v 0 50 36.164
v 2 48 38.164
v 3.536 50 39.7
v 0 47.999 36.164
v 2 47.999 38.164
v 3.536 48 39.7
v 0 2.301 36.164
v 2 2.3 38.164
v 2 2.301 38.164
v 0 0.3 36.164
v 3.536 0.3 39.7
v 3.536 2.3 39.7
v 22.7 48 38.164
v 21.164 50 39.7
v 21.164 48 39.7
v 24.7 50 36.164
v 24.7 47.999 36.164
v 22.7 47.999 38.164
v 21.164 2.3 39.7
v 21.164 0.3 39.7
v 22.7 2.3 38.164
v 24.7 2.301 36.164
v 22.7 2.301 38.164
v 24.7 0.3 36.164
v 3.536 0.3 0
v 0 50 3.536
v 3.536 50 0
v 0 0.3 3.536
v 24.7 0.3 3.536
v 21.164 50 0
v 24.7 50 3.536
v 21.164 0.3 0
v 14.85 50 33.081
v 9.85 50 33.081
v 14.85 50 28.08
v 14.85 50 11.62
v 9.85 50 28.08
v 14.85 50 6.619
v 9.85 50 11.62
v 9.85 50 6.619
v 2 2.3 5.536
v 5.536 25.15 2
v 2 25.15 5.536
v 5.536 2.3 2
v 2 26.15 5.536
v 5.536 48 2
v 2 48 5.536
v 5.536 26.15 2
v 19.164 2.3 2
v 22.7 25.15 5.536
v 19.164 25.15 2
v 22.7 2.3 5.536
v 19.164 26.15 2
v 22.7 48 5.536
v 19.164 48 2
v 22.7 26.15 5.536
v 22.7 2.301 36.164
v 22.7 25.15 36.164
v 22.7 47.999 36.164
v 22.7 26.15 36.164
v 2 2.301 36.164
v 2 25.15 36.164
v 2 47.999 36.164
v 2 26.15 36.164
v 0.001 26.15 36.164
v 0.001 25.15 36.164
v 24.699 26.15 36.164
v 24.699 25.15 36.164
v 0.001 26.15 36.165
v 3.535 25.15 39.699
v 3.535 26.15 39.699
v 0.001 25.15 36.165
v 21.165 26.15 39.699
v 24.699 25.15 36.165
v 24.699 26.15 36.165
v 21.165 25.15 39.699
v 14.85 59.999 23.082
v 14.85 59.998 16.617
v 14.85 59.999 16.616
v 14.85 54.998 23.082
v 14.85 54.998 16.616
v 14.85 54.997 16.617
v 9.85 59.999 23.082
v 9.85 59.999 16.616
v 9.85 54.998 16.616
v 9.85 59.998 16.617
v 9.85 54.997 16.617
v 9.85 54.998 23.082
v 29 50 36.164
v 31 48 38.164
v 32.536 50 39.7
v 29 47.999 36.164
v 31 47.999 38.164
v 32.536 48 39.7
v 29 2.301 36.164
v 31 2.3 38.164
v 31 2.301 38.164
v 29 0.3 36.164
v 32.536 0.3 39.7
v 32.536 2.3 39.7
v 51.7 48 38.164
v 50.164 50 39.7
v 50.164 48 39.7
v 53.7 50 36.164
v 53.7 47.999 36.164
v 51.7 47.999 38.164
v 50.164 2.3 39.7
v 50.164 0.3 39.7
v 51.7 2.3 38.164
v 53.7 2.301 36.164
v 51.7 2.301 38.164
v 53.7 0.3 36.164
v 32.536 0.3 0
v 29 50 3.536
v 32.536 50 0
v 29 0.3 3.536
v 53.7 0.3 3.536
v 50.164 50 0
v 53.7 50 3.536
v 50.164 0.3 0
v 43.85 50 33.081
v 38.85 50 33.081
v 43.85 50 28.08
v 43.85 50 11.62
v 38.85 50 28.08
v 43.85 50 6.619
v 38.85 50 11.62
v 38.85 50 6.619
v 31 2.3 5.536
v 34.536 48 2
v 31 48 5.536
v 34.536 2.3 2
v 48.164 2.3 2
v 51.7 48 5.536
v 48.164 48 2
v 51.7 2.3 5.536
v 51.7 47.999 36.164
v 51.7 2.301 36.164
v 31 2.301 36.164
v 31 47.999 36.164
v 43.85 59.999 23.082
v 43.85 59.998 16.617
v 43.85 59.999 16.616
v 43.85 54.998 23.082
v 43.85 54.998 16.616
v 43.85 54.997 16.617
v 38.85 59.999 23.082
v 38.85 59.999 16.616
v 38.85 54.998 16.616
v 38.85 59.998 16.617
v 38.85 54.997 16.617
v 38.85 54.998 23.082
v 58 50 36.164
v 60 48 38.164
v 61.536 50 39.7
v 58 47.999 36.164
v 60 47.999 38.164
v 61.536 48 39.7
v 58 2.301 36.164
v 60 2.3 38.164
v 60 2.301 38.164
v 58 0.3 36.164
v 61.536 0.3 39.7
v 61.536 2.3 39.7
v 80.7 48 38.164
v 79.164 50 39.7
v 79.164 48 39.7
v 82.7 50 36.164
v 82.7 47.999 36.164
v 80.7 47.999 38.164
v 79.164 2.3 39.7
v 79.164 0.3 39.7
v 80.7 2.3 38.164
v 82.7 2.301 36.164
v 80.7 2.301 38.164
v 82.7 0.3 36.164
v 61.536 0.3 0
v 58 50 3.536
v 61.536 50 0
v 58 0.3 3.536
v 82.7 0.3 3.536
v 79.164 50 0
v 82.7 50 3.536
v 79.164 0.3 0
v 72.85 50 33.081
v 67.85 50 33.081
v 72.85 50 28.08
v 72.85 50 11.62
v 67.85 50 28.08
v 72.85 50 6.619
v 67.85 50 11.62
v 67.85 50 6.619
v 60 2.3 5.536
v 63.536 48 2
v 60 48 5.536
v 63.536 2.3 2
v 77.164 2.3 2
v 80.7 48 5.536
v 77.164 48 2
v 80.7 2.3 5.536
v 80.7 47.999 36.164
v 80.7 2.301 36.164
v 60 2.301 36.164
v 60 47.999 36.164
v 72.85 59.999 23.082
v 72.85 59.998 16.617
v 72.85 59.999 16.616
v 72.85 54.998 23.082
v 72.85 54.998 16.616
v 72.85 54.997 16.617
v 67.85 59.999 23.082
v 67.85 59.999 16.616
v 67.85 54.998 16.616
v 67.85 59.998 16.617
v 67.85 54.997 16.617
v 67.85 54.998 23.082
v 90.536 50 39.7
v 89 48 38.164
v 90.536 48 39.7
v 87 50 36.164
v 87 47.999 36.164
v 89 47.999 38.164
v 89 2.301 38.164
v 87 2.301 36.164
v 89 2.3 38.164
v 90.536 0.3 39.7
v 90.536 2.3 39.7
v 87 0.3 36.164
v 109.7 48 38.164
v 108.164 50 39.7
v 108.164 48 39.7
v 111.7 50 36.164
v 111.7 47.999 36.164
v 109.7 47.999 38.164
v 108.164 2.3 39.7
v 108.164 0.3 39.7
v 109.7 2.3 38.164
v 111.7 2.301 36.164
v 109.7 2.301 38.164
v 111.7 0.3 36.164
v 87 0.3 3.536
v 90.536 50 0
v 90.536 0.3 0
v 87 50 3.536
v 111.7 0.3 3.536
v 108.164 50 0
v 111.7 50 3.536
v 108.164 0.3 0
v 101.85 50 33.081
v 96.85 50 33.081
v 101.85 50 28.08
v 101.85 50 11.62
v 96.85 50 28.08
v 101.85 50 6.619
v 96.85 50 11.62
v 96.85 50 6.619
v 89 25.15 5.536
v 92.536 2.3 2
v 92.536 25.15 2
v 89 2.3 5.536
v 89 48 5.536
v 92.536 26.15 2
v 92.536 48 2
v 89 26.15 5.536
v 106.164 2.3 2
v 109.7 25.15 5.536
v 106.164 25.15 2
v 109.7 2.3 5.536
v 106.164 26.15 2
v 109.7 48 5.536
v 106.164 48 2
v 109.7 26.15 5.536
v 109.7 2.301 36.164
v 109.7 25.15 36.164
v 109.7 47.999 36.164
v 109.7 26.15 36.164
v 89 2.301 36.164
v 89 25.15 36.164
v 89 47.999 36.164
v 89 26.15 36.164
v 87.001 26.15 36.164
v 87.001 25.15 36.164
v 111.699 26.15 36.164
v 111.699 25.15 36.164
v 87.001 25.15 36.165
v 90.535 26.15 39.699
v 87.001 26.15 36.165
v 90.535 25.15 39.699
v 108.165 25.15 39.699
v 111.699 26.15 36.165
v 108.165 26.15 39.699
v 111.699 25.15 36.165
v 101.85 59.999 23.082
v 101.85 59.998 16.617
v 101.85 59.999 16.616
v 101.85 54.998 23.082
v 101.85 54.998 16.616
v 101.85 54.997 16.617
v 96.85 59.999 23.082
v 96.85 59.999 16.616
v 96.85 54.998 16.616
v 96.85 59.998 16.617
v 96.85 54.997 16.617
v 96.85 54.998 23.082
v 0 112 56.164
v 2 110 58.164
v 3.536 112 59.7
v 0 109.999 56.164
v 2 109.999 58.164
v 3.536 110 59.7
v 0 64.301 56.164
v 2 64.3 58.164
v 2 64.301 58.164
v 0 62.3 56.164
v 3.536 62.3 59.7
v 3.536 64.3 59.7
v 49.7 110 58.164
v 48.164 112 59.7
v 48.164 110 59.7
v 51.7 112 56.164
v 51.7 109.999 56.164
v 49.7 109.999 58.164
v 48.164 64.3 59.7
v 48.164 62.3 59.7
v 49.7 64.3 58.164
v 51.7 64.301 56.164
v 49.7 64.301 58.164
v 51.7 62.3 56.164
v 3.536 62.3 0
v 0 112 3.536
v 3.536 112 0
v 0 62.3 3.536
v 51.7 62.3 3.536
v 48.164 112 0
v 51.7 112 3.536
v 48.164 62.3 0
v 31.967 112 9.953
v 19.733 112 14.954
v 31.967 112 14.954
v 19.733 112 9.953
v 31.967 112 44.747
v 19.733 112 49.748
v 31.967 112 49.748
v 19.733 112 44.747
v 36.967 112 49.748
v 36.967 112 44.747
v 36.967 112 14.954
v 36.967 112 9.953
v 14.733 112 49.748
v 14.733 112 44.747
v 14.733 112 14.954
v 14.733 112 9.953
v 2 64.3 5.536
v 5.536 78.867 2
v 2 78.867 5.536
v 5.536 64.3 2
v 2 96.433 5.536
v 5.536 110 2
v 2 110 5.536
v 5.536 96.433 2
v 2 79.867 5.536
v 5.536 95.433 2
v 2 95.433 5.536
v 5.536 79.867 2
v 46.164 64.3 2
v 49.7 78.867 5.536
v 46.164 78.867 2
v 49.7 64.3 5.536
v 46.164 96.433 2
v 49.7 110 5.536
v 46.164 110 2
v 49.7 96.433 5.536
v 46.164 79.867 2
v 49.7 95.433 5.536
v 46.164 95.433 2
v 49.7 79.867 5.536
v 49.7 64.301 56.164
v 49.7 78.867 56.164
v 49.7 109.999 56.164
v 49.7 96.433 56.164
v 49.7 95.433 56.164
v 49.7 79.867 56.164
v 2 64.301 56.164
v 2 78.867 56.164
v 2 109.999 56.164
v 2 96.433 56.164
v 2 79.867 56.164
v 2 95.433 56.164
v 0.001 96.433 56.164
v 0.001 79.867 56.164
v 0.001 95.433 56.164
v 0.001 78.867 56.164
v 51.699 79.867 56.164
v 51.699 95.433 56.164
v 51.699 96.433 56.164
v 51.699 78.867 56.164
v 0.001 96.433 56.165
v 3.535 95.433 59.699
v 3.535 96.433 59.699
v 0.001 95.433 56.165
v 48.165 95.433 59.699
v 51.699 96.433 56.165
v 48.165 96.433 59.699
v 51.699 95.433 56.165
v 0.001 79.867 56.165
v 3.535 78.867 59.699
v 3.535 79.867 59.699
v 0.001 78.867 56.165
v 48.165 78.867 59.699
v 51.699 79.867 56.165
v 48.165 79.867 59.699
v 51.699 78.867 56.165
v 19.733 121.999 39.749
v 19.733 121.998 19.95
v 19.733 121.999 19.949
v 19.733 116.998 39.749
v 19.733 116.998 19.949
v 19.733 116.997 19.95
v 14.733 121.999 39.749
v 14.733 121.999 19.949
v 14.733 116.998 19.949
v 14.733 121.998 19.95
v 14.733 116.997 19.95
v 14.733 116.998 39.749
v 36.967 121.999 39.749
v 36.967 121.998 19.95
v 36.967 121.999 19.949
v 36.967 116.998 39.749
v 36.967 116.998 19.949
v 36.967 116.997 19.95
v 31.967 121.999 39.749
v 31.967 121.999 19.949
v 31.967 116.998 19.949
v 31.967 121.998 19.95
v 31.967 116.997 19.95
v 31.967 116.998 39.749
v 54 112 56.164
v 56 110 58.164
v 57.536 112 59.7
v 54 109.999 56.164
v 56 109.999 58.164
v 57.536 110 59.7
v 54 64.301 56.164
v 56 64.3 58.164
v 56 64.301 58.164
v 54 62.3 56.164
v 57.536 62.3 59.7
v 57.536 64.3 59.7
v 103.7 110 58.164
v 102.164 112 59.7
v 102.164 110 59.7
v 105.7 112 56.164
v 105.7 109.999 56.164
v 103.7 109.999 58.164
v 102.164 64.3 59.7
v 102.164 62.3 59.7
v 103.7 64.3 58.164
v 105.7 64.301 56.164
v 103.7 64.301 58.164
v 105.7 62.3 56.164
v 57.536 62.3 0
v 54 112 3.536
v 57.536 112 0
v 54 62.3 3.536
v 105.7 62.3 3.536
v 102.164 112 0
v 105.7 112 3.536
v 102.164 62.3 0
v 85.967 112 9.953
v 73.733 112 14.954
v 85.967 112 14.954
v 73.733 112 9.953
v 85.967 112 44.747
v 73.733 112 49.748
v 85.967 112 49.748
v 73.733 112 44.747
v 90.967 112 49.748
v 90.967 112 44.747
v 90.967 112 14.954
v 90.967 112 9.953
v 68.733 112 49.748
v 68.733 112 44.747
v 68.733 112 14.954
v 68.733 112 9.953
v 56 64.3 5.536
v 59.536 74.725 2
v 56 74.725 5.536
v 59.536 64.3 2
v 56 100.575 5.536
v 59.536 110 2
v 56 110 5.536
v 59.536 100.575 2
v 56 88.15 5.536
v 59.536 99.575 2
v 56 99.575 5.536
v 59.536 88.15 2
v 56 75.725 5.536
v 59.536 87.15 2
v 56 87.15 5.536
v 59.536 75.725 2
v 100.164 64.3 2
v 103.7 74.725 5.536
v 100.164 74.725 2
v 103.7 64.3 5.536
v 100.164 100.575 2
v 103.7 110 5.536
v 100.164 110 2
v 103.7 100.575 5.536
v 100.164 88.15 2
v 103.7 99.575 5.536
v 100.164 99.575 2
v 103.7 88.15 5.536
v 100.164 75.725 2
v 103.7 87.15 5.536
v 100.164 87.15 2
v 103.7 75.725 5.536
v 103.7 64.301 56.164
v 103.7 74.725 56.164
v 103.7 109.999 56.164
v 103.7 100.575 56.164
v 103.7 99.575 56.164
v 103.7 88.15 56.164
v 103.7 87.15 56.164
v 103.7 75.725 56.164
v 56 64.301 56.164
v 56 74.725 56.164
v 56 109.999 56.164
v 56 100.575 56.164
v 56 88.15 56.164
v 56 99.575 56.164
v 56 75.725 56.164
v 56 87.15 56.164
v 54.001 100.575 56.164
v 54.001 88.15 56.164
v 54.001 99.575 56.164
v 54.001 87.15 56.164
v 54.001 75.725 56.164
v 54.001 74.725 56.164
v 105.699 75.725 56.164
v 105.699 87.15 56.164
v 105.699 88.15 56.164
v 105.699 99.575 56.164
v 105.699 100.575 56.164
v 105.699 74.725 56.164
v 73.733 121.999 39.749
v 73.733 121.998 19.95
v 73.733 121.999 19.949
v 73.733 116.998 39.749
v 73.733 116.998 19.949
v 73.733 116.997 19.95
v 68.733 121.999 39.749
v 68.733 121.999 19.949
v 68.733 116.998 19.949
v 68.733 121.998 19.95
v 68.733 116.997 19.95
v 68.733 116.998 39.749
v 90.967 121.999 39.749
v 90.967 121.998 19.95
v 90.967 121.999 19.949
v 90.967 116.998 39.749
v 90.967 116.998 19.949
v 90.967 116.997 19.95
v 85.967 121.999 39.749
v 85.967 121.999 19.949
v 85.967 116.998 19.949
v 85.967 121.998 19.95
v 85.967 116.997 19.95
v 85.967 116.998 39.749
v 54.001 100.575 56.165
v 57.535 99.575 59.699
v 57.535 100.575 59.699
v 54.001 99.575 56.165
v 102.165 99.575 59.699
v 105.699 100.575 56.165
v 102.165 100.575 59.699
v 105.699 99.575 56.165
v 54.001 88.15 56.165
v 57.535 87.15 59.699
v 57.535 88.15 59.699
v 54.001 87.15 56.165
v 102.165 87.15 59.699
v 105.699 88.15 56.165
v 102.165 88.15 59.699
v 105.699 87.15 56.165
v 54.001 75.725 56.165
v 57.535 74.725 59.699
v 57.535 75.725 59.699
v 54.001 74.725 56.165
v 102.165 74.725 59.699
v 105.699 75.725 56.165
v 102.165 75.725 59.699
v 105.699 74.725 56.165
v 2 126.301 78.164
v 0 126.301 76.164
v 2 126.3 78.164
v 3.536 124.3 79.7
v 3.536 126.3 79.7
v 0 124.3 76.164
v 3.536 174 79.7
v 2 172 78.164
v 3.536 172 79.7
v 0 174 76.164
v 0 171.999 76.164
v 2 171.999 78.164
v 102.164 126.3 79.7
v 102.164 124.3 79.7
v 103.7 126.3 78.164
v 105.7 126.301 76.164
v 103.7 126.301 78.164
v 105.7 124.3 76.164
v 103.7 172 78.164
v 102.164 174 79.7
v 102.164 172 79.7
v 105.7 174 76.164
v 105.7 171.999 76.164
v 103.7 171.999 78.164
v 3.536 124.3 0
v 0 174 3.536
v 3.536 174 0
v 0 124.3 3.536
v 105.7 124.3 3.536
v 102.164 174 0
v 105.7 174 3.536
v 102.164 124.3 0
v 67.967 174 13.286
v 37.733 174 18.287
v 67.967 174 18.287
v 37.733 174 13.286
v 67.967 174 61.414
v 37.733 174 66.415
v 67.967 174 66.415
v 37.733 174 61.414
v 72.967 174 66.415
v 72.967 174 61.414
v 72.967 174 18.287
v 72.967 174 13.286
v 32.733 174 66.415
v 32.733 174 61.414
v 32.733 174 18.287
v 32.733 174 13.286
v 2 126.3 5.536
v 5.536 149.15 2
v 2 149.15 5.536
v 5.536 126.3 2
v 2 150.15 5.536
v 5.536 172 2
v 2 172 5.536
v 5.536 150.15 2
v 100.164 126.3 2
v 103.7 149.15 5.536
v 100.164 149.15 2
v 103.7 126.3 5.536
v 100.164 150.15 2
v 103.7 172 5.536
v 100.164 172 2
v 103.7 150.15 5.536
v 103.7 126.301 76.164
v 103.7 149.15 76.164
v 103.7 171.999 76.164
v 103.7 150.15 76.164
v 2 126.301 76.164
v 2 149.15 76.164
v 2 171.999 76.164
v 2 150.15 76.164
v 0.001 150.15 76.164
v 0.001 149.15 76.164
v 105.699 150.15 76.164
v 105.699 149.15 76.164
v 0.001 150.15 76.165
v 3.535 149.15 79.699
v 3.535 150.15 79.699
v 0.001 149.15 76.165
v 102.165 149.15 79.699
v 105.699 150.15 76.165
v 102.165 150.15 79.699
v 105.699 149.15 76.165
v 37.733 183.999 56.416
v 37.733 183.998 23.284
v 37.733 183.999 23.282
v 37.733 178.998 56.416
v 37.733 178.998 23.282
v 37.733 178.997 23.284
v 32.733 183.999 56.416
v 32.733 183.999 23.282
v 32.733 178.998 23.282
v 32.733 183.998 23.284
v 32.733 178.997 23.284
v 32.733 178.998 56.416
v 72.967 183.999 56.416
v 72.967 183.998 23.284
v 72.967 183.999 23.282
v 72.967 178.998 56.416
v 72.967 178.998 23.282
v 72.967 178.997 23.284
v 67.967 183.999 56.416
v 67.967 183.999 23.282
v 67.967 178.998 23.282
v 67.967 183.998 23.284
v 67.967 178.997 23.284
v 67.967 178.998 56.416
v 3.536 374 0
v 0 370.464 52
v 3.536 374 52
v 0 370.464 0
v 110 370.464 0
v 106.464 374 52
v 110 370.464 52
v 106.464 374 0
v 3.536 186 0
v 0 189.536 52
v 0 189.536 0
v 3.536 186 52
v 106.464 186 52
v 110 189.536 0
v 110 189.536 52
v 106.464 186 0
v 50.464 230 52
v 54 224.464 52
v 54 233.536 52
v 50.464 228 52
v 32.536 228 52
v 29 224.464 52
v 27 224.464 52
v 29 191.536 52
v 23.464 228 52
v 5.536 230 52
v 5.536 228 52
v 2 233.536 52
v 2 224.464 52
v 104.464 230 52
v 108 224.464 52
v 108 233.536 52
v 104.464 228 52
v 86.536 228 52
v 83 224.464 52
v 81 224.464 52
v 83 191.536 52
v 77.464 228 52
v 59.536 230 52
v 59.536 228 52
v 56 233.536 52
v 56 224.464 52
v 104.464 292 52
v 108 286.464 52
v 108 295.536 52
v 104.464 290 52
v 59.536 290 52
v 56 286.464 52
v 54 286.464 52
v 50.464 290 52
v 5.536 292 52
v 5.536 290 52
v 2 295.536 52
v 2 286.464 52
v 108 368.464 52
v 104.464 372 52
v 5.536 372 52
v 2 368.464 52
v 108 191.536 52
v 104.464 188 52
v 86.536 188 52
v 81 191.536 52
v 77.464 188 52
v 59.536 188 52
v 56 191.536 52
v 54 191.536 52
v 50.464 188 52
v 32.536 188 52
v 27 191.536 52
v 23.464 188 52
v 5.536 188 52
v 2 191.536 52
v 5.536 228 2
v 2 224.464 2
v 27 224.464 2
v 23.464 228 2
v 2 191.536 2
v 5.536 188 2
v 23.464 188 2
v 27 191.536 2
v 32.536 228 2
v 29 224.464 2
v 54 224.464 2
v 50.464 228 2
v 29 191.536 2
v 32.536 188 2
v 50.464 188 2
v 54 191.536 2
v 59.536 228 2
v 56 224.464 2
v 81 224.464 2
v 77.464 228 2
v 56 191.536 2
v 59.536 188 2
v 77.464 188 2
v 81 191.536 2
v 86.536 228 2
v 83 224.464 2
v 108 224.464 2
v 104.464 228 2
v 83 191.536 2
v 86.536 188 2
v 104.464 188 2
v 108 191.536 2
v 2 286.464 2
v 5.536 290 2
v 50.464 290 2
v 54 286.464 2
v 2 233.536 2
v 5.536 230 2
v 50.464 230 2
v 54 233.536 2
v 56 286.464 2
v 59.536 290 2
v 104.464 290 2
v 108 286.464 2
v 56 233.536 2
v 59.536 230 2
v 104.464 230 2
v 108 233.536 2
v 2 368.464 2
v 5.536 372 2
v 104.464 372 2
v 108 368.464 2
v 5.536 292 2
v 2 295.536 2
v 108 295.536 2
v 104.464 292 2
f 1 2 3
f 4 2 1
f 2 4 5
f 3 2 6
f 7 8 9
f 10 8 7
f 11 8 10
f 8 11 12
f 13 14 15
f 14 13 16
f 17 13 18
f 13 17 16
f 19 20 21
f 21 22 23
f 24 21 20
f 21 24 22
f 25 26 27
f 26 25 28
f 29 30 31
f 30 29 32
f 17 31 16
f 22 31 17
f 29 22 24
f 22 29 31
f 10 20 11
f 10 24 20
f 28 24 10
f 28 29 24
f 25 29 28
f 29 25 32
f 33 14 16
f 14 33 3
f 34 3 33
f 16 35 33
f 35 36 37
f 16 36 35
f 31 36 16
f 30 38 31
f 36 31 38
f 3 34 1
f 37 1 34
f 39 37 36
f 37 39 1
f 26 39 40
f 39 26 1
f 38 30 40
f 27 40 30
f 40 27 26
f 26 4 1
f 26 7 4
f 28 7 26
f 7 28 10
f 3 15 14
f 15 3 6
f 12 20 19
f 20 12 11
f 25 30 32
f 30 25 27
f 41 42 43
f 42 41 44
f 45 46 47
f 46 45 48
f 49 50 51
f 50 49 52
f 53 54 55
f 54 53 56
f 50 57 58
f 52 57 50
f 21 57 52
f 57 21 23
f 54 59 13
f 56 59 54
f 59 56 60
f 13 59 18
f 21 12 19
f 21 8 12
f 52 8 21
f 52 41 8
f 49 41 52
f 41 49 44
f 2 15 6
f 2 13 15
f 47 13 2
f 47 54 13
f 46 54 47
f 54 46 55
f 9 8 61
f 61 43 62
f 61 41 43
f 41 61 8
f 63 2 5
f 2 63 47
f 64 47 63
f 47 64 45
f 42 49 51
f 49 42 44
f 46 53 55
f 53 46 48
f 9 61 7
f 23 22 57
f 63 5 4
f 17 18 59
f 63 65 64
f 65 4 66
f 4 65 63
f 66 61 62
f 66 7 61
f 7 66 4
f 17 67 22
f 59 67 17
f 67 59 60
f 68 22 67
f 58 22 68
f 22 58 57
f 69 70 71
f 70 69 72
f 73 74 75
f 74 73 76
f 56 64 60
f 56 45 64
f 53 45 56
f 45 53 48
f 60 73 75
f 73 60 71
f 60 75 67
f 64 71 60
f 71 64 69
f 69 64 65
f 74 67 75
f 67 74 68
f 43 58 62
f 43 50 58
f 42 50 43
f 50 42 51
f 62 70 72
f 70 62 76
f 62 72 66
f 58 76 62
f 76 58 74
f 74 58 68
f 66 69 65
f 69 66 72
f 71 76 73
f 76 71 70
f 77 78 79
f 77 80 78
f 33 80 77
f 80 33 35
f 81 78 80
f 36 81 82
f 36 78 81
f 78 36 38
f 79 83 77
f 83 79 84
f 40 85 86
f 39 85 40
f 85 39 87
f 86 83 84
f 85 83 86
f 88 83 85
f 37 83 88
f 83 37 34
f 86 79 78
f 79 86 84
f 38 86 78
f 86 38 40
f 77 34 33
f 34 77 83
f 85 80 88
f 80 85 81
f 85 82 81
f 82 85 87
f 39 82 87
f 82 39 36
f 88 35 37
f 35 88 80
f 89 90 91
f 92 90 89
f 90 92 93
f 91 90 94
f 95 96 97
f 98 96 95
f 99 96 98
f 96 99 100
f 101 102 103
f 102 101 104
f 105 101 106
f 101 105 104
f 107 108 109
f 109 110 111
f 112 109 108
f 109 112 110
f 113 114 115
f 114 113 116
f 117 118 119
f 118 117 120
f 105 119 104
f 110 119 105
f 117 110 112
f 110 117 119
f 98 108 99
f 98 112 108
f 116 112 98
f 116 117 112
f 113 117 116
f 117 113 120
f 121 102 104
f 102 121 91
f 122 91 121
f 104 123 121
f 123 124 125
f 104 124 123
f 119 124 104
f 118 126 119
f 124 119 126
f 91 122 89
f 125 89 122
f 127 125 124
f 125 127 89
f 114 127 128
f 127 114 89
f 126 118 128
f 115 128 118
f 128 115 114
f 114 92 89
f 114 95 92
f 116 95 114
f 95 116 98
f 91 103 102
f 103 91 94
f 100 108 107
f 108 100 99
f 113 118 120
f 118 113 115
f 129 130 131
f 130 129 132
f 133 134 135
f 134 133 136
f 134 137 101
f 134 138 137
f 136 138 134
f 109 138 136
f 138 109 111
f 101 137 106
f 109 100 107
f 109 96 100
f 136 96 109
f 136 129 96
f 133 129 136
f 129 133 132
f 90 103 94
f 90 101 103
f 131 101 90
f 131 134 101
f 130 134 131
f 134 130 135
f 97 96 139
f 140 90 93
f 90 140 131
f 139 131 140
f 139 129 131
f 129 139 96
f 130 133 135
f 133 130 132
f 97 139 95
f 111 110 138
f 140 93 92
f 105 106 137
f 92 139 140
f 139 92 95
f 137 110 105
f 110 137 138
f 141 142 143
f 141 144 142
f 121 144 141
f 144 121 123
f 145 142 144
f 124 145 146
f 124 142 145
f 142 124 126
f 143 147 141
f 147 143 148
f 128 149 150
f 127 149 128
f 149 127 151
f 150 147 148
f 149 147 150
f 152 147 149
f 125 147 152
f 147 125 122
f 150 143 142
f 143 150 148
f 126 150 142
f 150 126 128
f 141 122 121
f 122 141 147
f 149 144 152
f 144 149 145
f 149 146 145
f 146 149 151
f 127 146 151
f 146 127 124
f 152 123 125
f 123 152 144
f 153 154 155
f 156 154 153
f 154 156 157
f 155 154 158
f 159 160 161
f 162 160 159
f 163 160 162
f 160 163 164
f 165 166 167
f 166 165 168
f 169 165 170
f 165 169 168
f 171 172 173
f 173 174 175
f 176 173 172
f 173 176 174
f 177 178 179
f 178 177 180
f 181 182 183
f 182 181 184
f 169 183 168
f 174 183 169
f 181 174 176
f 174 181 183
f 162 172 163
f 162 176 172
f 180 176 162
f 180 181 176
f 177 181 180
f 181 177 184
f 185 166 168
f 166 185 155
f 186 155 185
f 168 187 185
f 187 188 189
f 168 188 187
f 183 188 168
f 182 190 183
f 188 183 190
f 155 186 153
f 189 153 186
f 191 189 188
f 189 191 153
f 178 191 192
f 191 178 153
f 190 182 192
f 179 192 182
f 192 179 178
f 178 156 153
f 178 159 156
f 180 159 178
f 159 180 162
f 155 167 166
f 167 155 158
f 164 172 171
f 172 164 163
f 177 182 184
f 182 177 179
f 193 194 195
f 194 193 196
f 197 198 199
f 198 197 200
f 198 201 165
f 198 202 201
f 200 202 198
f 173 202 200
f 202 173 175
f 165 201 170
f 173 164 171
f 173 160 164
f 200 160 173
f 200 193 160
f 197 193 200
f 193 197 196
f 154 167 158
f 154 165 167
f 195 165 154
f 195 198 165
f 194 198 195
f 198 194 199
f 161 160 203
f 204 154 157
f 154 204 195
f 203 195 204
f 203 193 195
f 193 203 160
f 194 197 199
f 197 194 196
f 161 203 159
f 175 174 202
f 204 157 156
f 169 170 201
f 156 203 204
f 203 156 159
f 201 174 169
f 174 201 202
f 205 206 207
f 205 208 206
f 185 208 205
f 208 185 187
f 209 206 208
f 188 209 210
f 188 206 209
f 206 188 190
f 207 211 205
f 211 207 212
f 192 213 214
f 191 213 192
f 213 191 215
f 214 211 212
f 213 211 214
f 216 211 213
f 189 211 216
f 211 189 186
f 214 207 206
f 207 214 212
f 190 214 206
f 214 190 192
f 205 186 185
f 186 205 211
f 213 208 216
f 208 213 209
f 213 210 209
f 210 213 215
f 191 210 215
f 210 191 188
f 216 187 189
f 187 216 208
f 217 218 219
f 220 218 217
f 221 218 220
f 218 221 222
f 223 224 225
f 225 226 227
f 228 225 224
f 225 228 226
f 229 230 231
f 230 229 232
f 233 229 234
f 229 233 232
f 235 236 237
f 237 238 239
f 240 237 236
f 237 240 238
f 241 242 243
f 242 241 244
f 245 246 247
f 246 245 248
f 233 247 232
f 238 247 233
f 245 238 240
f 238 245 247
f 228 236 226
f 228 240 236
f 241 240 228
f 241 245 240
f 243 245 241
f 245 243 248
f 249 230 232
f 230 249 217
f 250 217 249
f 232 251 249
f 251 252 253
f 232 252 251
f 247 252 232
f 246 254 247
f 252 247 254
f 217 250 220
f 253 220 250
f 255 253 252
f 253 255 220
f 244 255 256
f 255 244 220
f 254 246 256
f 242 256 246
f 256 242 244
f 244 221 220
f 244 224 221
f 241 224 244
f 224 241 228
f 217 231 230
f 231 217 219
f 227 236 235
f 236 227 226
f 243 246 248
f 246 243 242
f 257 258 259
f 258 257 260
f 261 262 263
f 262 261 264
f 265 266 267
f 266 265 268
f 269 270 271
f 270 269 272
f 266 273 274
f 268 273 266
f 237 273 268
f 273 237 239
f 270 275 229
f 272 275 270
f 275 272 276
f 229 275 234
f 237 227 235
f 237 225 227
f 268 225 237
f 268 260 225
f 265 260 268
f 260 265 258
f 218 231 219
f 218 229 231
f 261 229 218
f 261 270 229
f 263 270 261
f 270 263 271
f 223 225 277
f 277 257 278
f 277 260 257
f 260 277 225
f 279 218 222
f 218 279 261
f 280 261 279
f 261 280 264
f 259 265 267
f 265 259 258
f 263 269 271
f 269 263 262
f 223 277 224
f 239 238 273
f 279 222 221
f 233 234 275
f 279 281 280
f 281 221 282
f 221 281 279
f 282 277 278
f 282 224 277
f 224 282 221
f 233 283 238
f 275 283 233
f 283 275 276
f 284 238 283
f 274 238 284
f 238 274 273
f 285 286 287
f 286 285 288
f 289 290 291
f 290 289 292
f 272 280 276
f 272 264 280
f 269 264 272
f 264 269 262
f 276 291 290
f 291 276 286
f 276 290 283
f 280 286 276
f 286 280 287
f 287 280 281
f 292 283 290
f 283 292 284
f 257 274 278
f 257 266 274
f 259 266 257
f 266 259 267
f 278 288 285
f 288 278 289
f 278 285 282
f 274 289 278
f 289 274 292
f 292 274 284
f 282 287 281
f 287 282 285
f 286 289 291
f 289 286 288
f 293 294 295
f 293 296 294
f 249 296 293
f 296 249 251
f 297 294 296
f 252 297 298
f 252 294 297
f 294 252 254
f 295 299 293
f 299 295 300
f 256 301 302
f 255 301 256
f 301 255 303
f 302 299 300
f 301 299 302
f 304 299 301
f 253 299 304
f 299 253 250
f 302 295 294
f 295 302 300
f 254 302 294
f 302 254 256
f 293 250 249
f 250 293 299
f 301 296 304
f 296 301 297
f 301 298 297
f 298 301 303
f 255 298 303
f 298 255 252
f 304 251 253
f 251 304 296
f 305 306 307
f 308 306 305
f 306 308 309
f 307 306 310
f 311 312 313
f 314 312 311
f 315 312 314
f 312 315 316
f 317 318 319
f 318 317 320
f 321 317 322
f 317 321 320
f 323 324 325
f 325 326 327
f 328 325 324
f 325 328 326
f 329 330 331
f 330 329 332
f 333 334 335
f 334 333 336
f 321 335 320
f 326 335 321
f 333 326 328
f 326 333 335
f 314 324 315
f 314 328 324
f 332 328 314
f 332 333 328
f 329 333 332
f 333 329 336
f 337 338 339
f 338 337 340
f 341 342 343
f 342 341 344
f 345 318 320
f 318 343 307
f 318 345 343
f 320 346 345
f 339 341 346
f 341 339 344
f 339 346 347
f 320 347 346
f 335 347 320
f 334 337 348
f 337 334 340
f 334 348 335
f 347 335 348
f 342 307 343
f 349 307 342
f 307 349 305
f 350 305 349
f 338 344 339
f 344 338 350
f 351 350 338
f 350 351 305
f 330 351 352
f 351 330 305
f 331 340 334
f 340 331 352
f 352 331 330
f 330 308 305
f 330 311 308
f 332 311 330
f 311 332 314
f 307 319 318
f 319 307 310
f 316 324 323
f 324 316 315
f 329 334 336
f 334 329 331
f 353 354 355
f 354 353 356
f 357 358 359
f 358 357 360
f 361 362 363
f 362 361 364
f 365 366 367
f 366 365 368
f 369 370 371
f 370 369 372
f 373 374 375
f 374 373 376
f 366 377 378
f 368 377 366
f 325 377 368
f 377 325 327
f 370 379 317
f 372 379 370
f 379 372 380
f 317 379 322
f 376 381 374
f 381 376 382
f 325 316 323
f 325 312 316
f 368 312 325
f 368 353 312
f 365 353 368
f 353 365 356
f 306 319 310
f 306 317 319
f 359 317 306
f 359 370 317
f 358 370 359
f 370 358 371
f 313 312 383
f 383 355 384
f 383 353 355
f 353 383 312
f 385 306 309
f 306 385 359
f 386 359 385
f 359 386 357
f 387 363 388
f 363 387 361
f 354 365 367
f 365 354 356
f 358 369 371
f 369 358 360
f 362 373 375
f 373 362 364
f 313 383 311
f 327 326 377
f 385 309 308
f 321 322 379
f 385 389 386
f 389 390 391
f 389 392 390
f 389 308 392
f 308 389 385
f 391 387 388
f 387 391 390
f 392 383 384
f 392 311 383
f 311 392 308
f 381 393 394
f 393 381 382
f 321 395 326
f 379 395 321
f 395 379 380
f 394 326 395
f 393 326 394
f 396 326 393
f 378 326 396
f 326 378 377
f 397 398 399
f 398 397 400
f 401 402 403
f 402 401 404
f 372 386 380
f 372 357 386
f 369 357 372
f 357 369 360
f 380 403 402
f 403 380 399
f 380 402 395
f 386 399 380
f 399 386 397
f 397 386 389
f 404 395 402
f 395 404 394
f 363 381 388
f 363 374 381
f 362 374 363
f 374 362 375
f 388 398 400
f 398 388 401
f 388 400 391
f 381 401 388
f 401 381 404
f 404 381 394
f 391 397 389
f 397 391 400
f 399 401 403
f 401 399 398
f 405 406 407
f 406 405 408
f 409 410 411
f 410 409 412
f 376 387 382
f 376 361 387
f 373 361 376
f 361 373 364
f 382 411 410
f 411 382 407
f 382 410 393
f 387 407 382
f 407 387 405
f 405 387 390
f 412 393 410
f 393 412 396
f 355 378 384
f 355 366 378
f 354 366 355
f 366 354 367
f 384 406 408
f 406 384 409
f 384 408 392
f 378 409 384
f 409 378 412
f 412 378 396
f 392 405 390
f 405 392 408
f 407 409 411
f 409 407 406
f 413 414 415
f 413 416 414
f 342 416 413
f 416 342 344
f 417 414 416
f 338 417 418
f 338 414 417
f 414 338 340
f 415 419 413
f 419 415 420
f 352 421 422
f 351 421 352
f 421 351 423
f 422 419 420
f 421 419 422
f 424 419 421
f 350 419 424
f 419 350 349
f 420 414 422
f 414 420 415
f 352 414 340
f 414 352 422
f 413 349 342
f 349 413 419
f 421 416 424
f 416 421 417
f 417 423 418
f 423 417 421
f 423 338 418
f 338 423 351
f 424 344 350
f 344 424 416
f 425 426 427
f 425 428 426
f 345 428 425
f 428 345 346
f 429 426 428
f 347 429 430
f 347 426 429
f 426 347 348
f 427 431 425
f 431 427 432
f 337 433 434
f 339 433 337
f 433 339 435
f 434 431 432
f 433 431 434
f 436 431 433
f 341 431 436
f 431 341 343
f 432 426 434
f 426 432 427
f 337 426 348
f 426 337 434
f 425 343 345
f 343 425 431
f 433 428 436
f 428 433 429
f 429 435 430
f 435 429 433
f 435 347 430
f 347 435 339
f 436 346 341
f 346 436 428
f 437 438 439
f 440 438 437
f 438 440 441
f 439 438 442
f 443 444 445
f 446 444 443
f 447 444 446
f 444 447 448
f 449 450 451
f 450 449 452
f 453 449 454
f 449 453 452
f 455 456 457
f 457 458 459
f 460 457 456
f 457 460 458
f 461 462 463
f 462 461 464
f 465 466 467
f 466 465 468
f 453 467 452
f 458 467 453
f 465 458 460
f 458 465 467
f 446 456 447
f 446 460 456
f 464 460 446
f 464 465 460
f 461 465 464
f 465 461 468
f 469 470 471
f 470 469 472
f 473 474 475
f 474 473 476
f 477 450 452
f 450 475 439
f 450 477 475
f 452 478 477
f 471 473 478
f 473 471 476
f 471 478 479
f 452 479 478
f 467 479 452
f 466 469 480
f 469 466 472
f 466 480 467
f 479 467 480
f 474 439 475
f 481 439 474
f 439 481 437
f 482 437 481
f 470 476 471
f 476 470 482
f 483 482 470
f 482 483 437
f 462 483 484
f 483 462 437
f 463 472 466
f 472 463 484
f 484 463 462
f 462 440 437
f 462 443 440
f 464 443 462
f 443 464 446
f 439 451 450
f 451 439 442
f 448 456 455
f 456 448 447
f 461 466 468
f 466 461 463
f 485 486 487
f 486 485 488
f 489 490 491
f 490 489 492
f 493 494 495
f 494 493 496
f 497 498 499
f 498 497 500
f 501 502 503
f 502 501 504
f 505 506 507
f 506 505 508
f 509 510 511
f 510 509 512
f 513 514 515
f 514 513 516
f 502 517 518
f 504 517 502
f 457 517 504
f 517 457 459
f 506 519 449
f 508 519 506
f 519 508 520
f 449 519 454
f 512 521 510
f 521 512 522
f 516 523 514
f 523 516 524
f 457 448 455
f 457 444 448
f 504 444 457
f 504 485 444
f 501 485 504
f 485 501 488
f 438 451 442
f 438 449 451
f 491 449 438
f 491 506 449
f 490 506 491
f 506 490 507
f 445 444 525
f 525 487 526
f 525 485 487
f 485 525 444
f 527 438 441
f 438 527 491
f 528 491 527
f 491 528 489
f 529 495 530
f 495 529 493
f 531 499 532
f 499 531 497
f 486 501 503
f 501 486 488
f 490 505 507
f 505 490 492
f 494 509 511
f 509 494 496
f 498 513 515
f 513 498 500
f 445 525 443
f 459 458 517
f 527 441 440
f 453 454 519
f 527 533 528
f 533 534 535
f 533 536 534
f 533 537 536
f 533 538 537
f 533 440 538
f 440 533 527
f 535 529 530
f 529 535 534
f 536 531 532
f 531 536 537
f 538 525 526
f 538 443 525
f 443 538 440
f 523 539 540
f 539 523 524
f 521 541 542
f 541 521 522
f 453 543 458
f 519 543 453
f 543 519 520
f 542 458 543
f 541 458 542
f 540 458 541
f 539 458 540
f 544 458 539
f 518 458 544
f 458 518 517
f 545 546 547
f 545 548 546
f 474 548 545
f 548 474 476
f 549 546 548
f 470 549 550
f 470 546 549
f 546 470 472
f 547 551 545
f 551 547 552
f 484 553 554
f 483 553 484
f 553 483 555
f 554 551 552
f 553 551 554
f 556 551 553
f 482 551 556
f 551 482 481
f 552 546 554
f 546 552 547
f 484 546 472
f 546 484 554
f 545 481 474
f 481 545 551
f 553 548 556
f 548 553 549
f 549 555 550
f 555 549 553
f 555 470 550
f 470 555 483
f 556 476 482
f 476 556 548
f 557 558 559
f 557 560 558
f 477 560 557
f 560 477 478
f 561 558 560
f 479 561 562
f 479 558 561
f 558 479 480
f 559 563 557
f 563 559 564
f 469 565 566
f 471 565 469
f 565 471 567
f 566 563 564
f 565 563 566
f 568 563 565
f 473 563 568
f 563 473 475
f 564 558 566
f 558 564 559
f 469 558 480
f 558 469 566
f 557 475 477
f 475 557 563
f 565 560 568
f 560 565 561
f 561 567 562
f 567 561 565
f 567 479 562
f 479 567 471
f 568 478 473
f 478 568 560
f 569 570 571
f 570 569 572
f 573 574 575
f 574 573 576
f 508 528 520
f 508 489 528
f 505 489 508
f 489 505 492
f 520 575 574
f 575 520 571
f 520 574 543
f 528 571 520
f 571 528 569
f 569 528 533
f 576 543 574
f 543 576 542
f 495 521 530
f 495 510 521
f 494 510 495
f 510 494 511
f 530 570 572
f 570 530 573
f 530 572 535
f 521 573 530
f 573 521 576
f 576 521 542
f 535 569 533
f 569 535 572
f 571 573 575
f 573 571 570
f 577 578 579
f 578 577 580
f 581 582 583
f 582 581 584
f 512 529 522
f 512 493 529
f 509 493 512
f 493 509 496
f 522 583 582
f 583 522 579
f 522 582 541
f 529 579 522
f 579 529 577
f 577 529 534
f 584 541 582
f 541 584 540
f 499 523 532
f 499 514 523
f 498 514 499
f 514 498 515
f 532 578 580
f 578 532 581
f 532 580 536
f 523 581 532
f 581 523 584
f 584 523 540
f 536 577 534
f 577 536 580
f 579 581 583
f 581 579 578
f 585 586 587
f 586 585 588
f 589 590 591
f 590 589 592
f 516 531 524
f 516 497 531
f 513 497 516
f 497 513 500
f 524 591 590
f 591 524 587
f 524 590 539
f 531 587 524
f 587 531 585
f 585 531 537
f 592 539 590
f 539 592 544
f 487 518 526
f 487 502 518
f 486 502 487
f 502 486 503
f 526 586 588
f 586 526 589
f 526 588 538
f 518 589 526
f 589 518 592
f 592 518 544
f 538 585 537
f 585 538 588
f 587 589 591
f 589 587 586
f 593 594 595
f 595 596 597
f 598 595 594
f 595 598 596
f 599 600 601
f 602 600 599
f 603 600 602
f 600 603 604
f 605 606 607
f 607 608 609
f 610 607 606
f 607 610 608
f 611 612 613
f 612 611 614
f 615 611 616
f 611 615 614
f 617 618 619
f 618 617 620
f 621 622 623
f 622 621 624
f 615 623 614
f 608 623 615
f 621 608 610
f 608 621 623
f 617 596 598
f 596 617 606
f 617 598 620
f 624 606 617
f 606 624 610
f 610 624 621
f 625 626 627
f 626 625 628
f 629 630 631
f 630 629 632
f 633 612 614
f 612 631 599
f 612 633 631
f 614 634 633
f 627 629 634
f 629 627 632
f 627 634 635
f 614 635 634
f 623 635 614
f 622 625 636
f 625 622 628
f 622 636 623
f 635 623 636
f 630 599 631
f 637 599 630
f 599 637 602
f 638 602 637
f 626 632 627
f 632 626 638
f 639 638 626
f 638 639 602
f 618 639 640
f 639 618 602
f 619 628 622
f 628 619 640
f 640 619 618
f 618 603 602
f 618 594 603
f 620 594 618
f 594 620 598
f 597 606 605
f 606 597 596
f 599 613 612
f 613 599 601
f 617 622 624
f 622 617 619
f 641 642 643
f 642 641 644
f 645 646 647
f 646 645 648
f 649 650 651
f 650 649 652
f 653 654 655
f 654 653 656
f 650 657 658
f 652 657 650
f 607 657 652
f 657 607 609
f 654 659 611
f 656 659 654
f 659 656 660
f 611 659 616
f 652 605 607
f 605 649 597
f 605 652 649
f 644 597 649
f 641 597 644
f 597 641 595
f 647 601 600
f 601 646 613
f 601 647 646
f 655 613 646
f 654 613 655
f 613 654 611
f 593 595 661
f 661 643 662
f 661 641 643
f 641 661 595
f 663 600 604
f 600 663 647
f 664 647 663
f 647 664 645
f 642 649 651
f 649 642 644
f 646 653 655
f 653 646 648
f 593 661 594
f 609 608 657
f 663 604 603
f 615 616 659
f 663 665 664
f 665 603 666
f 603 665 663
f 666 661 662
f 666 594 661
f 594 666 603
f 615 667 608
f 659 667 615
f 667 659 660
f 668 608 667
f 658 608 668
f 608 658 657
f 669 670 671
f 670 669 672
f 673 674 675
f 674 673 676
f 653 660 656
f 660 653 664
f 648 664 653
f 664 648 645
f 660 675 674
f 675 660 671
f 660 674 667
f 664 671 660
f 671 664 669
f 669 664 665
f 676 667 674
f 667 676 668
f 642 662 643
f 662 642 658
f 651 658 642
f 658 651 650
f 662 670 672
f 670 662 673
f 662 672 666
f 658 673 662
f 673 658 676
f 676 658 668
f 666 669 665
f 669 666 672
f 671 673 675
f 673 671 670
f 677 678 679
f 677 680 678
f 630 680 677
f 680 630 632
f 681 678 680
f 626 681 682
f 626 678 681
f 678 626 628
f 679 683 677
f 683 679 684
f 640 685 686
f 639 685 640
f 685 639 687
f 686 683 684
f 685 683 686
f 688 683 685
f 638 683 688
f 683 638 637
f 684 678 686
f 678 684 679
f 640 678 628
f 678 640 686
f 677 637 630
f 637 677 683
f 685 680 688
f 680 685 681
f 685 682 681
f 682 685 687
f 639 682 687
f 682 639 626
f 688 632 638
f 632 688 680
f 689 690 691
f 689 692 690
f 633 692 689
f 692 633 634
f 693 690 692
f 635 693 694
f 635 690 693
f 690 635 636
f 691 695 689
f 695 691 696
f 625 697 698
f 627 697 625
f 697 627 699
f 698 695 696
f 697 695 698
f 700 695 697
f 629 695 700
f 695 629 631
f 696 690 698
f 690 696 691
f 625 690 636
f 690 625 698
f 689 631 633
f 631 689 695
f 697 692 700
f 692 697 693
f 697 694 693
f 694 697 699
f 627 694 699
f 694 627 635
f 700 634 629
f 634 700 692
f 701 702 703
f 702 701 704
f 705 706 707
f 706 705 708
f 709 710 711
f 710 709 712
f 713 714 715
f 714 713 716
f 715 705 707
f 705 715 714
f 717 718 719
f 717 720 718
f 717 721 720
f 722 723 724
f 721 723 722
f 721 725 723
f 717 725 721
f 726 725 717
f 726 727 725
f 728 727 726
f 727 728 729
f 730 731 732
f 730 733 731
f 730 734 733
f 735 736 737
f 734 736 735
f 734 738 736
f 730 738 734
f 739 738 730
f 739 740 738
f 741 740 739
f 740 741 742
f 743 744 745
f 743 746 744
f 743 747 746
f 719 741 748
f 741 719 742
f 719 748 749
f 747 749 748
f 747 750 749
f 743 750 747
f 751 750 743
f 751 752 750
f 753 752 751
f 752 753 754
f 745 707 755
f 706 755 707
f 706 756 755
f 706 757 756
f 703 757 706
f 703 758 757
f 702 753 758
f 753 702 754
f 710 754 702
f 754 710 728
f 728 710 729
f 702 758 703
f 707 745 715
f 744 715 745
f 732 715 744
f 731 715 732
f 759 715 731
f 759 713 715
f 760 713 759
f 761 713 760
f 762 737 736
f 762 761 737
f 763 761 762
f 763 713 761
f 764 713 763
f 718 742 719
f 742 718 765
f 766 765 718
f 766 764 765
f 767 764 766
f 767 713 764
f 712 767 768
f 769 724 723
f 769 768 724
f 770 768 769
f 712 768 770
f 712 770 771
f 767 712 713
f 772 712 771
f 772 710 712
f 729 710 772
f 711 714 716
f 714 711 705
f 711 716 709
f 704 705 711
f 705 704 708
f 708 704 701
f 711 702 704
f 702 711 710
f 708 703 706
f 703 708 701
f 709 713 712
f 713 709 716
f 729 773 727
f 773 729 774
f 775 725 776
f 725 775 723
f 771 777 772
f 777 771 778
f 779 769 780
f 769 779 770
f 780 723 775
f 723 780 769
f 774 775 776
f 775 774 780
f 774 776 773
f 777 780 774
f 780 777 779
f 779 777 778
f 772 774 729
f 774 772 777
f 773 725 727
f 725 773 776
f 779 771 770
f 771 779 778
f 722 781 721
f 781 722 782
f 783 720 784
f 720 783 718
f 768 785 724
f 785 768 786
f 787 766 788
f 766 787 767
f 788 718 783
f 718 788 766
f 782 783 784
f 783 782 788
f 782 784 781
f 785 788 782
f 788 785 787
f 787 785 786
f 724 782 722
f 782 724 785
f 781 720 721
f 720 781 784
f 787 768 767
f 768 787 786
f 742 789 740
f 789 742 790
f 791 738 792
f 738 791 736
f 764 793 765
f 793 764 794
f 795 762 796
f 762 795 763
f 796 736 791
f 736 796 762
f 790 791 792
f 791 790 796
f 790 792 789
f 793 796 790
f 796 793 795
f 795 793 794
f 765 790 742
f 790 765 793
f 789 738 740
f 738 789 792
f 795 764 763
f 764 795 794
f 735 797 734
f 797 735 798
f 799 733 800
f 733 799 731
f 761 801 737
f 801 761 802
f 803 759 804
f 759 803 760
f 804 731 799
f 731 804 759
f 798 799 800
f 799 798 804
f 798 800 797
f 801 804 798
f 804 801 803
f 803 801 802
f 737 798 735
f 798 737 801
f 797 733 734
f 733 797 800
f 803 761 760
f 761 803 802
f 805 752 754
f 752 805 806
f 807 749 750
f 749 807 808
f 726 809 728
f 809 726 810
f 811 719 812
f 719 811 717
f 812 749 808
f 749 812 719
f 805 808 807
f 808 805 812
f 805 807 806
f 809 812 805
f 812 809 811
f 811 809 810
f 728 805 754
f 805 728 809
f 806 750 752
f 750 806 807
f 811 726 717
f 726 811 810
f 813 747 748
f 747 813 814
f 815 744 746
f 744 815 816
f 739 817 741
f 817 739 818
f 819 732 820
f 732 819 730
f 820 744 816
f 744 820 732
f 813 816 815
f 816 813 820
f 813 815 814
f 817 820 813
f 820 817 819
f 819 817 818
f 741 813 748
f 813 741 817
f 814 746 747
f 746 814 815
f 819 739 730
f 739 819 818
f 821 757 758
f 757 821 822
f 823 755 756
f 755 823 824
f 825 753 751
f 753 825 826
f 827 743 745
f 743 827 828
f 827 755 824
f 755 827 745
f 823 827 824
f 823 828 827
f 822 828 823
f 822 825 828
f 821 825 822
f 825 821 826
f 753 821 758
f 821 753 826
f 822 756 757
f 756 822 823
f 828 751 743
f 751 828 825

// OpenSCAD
// preview[view:north west, tilt:top diagonal]

/* [Basics] */
// Units in mm that make up the width of the drawers
unit_width = 25; // [10:100]
// Units in mm that make up the height of the drawers
unit_height = 20; // [10:100]
// Depth front-to-back of all drawers in mm
unit_depth = 50; // [20:200]
// Thickness of handle in mm
handle_thickness=5; // [3:30]
// Depth of handle in mm
handle_depth=10; // [10:50]
// Thickness of the walls in mm (drawer walls and gap between drawers)
wall = 2; // [1:10]
// Size of bevel in mmon corners 
bevel = 5; // [0:20]
// Space in mm between components on the bed
print_space = 2;

/* [Drawers] */

// ## Complex example ##
// Unit width of each drawer
widths = [[1, 1, 1, 1], [2, 2], [4]];
// Unit height of each drawer
heights = [[2, 2, 2, 2], [3, 3], [4]];
// Number of dividers in each drawer
dividers = [[1, 0, 0, 1], [2, 3], [1]];
// Number of handles on the front of each drawer
handles = [[1, 1, 1, 1], [2, 2], [2]];

module simple_example() {
    // ## Simple example ##
    // Unit width of each drawer
    widths = [[1, 1], [2]];
    // Unit height of each drawer
    heights = [[1, 1], [1]];
    // Number of dividers in each drawer
    dividers = [[1, 1], [1]];
    // Number of handles on the front of each drawer
    handles = [[1, 1], [2]];
}

module super_simple_example() {
    // ## Super Simple Single Drawer example ##
    // Width in width units of each drawer
    widths = [[3]];
    // Height in height units of each drawer
    heights = [[4]];
    // Number of dividers in each drawer
    dividers = [[1]];
    // Number of handles on the front of each drawer
    handles = [[2]];
}

/* [Global] */
// What part(s) do you want to look at?
part = "both"; // [drawers:Drawers Only,frame:Frame Only,both:Drawers and Frame]

// Include the drawers
drawers = part == "drawers" || part == "both";
// Include the frame
frame = part == "frame" || part == "both";

module go() {
    // Tolerance space between sliding parts
    sliding_tol = 0.3;
    // Separator used to avoid congruent vertices/lines/planes
    sep = 0.001;
    hb = bevel / 2;

    // Flatten a vector of vectors
    function flatten(a) = [for (a = l) for (b = a) b];
    // Sum first n terms, defaults to all terms
    function sum(a, n=-1, i=0, t=0) = i < len(a) && i != n ? sum(a, n, i + 1, t + a[i]) : t;

    module bevel(depth) {
        // Build a subtractive bevel with x-section bevel squared and supplied depth 
        rotate(45) translate([-hb, -hb, -1]) cube([bevel, bevel, depth + 2]);
    }

    module bevel_box(width, height, depth, bevel, bevel_top=true) {
        // Build a box with a bevelled edge
        difference() {
            // Box
            cube([width, height, depth]);
            union() {
                // Bevels
                translate([0, 0, -1]) {
                    bevel(depth + 2);
                };
                translate([width, 0, -1]) {
                    bevel(depth + 2);
                };
                if (bevel_top) {
                    translate([0, height, -1]) {
                        bevel(depth + 2);
                    };
                    translate([width, height, -1]) {
                        bevel(depth + 2);
                    };
                }
            };
        }
    }

    module bevel_divider(drawer_id, divider_id, width, height, depth, bevel) {
        // build a bevel divider for given drawer
        // Depth is the mid point of the divider in the drawer
        // echo("Divider", drawer_id=drawer_id, divider_id=divider_id, width=width, height=height, depth=depth, bevel=bevel);
        translate([0, 0, depth])
        intersection() {
            difference() {
                bevel_box(width, height, unit_depth, bevel, true);
                // Keep from face of drawer
                translate([-sep, -sep, wall + sep])
                    cube([width + 2 * sep, height + 2 * sep, unit_depth]);
            }
            // Remove clashing vertices, edges and planes
            translate([sep, sep, -1]) 
                cube([width - 2 * sep, height - 2 * sep, 2]);
        }
    }

    module handle(drawer_id, handle_id, height, width, depth, thickness=handle_thickness) {
        // Build a handle with given width height and depth
        // Thickness is the handle size in mm
        // echo("Handle", drawer_id=drawer_id, handle_id=handle_id, height=height, width=width, depth=depth);
        
        module handle_shell(h, w, d, b) {
            // Build extruded trapezoid for handle
            difference() {
                cube([w, h, d]);
                translate([-sep, -sep, -d])
                    rotate([45, 0, 0]) 
                        cube([w + 2 * sep, b + 2 * sep, b]);
                translate([-sep, h - sep, -d])
                    rotate([45, 0, 0]) 
                        cube([w + 2 * sep, b + 2 * sep, b]);
            
            }
        }
        
        // Calculate the bevel edge length
        function bev(d, h) = pow(2 * pow(min(d, h/2), 2), 0.5);
        
        // Calculate handle cutout dimensions
        d2 = depth - thickness;
        h2 = height - 2 * thickness;
        // Calculate bevel size for exterior and interior
        b1 = bev(depth, height);
        b2 = bev(d2, h2);
        
        
        difference(){ 
            // Exterior of handle
            handle_shell(height, width, depth, b1);
            // Inner cut out of handle
            translate([-sep, thickness, thickness + sep]) 
                handle_shell(h2, width + 2 * sep, d2, b2);
        }
    }

    module lay() {
        // debug method
        if (true) {
            translate([0, unit_depth, 0])
                rotate([90, 0, 0])
                    children();
        } else {
            children();
        }
    }

    module drawer(id=1, width=1, height=1, handles=1, dividers=1, bevel=bevel, extra=0) {
        // Build a drawer with:
        //  width: mutiple of standard width
        //  height: mutiple of standard height
        //  handles: Given number of handles
        //  dividers: Number of drawer dividers
        //  bevel: Size of corner bevel
        //  extra: Extra value added to all dimensions for tolerances
        
        w = width * unit_width + (width - 1) * wall + extra;
        h = height * unit_height + extra;
        d = unit_depth + extra;
        // echo("Drawer", id=id, w=w, h=h, d=d);
        // echo(bevel=bevel, extra=extra);
        // echo(handles=handles, dividers=dividers);
        lay()
        union() {
            // Add drawer
            if (true) {
                difference() {
                    // Outer box
                    bevel_box(w, h, d, bevel);
                    // Inner space
                    translate([wall, wall, wall]) {
                        bevel_box(
                                w - 2 * wall, 
                                h + 2 * wall, 
                                d - 2 * wall,
                                bevel,
                                false);
                    };
                    hxb = pow(2 * pow(hb, 2), 0.5);
                    translate([-1, h - hxb, wall + sep]) {
                        cube([w + 2, hb + 2, d - 2 * wall - 2 * sep]);
                    }
                }
            }
            // Add dividers
            if (dividers > 0) {
                // echo(dividers=dividers);
                div_offset = d / (dividers + 1);
                for (divider = [0 + 1:dividers]) {
                    // echo(divider=divider);
                    bevel_divider(id, divider, w, h, div_offset * divider - wall / 2, bevel);
                }
            }
            // Add handles
            if (handles > 0) {
                // echo(handles=handles);
                handle_height = h / 1.5;
                handle_offset = w / (handles + 1);
                
                for (handle = [0 + 1:handles]) {
                    // echo(handle=handle);
                    offset_x = handle_offset * handle - handle_thickness / 2;
                    offset_y = (h - handle_height) / 2;
                    translate([offset_x, offset_y, -handle_depth + sep]) {
                        handle(id, handle, handle_height, handle_thickness, handle_depth);
                    }
                }
            }
        }
    }


    module build_drawers(widths, heights, dividers, handles) {
        // echo("===DRAWERS===");
        // Build each of the drawers
        for (row_id=[0:len(widths) - 1]) {
            row_widths = widths[row_id];
            row_heights = heights[row_id];
            row_dividers = dividers[row_id];
            row_handles = handles[row_id];
            
            max_row_width = max(row_widths);
            translate([0, row_id * (unit_depth + handle_depth + print_space), 0]) {
                for (drawer_id=[0:len(row_widths) - 1]) {
                    drawer_widths = row_widths[drawer_id];
                    drawer_heights = row_heights[drawer_id];
                    drawer_divides = row_dividers[drawer_id];
                    drawer_handles = row_handles[drawer_id];

                    // echo(row_id=row_id, drawer_id=drawer_id);
                    // echo(widths=drawer_widths, dividers=drawer_divides, handles=drawer_handles);
                    x_offset = drawer_id * max_row_width * unit_width + drawer_id * (wall + print_space);
                    translate([x_offset, 0, 0]) {
                        drawer(
                            [row_id, drawer_id], 
                            width=drawer_widths, 
                            height=drawer_heights, 
                            handles=drawer_handles, 
                            dividers=drawer_divides,
                            extra=-sliding_tol);
                    }
                }
            }
        }
    }

    module build_frame(widths, heights) {
        // echo("===FRAME===");
        // Max drawer height on a row
        function row_height(n) = max(heights[n]);

        full_drawer_width = max([for (r = widths) sum(r)]);
        full_drawer_height = sum([for (r = heights) max(r)]);
        
        // echo(full_drawer_width=full_drawer_width, full_drawer_height=full_drawer_height);
        rows = len(widths);
        
        frame_width = full_drawer_width * unit_width + (full_drawer_width + 1) * wall;
        frame_height = full_drawer_height * unit_height + (rows + 1) * wall;
        frame_depth = unit_depth + wall;
        // echo(frame_width=frame_width);
        // echo(frame_height=frame_height);
        // echo(frame_depth=frame_depth);
        
        // Allow for the previously printed drawers
        offset_y = drawers ? rows * (unit_depth + handle_depth + print_space) : 0;
        translate([0, offset_y, 0]) {
            difference() {
                // Frame outline
                bevel_box(frame_width, frame_height, frame_depth);
                // All drawers
                union() {
                    for (row_id=[0:len(widths) - 1]) {
                        row_widths = widths[row_id];
                        row_heights = heights[row_id];
                        total_drawer_heights = row_id == 0 ? 0 : sum([for (x=[0:row_id - 1]) row_height(x) * unit_height]);
                        // echo(total_drawer_heights=total_drawer_heights);
                        row_offset = (row_id + 1) * wall + total_drawer_heights;
                        // echo(row_id=row_id, row_offset=row_offset);
                        translate([0, row_offset, wall]) {
                            for (drawer_id=[0:len(row_widths) - 1]) {
                                drawer_widths = row_widths[drawer_id];
                                drawer_heights = row_heights[drawer_id];
                                
                                previous_drawers = sum(row_widths, drawer_id);
                                col_offset = wall + previous_drawers*(unit_width + wall);
                                translate([col_offset, 0, 0]) {
                                    //echo(drawer_id=drawer_id, col_offset=col_offset);
                                    //echo(previous_drawers=previous_drawers);
                                    dw = drawer_widths * unit_width + (drawer_widths - 1) * wall;
                                    dh = drawer_heights * unit_height;
                                    bevel_box(dw, dh, unit_depth + 10);
                                }
                            }
                        }
                    }
                }
            }
        }
    }

    // Build and layout the drawers
    if (drawers)
        build_drawers(widths, heights, dividers, handles);
    
    // Build and layout the frame
    if (frame)
        build_frame(widths, heights);
}

go();

